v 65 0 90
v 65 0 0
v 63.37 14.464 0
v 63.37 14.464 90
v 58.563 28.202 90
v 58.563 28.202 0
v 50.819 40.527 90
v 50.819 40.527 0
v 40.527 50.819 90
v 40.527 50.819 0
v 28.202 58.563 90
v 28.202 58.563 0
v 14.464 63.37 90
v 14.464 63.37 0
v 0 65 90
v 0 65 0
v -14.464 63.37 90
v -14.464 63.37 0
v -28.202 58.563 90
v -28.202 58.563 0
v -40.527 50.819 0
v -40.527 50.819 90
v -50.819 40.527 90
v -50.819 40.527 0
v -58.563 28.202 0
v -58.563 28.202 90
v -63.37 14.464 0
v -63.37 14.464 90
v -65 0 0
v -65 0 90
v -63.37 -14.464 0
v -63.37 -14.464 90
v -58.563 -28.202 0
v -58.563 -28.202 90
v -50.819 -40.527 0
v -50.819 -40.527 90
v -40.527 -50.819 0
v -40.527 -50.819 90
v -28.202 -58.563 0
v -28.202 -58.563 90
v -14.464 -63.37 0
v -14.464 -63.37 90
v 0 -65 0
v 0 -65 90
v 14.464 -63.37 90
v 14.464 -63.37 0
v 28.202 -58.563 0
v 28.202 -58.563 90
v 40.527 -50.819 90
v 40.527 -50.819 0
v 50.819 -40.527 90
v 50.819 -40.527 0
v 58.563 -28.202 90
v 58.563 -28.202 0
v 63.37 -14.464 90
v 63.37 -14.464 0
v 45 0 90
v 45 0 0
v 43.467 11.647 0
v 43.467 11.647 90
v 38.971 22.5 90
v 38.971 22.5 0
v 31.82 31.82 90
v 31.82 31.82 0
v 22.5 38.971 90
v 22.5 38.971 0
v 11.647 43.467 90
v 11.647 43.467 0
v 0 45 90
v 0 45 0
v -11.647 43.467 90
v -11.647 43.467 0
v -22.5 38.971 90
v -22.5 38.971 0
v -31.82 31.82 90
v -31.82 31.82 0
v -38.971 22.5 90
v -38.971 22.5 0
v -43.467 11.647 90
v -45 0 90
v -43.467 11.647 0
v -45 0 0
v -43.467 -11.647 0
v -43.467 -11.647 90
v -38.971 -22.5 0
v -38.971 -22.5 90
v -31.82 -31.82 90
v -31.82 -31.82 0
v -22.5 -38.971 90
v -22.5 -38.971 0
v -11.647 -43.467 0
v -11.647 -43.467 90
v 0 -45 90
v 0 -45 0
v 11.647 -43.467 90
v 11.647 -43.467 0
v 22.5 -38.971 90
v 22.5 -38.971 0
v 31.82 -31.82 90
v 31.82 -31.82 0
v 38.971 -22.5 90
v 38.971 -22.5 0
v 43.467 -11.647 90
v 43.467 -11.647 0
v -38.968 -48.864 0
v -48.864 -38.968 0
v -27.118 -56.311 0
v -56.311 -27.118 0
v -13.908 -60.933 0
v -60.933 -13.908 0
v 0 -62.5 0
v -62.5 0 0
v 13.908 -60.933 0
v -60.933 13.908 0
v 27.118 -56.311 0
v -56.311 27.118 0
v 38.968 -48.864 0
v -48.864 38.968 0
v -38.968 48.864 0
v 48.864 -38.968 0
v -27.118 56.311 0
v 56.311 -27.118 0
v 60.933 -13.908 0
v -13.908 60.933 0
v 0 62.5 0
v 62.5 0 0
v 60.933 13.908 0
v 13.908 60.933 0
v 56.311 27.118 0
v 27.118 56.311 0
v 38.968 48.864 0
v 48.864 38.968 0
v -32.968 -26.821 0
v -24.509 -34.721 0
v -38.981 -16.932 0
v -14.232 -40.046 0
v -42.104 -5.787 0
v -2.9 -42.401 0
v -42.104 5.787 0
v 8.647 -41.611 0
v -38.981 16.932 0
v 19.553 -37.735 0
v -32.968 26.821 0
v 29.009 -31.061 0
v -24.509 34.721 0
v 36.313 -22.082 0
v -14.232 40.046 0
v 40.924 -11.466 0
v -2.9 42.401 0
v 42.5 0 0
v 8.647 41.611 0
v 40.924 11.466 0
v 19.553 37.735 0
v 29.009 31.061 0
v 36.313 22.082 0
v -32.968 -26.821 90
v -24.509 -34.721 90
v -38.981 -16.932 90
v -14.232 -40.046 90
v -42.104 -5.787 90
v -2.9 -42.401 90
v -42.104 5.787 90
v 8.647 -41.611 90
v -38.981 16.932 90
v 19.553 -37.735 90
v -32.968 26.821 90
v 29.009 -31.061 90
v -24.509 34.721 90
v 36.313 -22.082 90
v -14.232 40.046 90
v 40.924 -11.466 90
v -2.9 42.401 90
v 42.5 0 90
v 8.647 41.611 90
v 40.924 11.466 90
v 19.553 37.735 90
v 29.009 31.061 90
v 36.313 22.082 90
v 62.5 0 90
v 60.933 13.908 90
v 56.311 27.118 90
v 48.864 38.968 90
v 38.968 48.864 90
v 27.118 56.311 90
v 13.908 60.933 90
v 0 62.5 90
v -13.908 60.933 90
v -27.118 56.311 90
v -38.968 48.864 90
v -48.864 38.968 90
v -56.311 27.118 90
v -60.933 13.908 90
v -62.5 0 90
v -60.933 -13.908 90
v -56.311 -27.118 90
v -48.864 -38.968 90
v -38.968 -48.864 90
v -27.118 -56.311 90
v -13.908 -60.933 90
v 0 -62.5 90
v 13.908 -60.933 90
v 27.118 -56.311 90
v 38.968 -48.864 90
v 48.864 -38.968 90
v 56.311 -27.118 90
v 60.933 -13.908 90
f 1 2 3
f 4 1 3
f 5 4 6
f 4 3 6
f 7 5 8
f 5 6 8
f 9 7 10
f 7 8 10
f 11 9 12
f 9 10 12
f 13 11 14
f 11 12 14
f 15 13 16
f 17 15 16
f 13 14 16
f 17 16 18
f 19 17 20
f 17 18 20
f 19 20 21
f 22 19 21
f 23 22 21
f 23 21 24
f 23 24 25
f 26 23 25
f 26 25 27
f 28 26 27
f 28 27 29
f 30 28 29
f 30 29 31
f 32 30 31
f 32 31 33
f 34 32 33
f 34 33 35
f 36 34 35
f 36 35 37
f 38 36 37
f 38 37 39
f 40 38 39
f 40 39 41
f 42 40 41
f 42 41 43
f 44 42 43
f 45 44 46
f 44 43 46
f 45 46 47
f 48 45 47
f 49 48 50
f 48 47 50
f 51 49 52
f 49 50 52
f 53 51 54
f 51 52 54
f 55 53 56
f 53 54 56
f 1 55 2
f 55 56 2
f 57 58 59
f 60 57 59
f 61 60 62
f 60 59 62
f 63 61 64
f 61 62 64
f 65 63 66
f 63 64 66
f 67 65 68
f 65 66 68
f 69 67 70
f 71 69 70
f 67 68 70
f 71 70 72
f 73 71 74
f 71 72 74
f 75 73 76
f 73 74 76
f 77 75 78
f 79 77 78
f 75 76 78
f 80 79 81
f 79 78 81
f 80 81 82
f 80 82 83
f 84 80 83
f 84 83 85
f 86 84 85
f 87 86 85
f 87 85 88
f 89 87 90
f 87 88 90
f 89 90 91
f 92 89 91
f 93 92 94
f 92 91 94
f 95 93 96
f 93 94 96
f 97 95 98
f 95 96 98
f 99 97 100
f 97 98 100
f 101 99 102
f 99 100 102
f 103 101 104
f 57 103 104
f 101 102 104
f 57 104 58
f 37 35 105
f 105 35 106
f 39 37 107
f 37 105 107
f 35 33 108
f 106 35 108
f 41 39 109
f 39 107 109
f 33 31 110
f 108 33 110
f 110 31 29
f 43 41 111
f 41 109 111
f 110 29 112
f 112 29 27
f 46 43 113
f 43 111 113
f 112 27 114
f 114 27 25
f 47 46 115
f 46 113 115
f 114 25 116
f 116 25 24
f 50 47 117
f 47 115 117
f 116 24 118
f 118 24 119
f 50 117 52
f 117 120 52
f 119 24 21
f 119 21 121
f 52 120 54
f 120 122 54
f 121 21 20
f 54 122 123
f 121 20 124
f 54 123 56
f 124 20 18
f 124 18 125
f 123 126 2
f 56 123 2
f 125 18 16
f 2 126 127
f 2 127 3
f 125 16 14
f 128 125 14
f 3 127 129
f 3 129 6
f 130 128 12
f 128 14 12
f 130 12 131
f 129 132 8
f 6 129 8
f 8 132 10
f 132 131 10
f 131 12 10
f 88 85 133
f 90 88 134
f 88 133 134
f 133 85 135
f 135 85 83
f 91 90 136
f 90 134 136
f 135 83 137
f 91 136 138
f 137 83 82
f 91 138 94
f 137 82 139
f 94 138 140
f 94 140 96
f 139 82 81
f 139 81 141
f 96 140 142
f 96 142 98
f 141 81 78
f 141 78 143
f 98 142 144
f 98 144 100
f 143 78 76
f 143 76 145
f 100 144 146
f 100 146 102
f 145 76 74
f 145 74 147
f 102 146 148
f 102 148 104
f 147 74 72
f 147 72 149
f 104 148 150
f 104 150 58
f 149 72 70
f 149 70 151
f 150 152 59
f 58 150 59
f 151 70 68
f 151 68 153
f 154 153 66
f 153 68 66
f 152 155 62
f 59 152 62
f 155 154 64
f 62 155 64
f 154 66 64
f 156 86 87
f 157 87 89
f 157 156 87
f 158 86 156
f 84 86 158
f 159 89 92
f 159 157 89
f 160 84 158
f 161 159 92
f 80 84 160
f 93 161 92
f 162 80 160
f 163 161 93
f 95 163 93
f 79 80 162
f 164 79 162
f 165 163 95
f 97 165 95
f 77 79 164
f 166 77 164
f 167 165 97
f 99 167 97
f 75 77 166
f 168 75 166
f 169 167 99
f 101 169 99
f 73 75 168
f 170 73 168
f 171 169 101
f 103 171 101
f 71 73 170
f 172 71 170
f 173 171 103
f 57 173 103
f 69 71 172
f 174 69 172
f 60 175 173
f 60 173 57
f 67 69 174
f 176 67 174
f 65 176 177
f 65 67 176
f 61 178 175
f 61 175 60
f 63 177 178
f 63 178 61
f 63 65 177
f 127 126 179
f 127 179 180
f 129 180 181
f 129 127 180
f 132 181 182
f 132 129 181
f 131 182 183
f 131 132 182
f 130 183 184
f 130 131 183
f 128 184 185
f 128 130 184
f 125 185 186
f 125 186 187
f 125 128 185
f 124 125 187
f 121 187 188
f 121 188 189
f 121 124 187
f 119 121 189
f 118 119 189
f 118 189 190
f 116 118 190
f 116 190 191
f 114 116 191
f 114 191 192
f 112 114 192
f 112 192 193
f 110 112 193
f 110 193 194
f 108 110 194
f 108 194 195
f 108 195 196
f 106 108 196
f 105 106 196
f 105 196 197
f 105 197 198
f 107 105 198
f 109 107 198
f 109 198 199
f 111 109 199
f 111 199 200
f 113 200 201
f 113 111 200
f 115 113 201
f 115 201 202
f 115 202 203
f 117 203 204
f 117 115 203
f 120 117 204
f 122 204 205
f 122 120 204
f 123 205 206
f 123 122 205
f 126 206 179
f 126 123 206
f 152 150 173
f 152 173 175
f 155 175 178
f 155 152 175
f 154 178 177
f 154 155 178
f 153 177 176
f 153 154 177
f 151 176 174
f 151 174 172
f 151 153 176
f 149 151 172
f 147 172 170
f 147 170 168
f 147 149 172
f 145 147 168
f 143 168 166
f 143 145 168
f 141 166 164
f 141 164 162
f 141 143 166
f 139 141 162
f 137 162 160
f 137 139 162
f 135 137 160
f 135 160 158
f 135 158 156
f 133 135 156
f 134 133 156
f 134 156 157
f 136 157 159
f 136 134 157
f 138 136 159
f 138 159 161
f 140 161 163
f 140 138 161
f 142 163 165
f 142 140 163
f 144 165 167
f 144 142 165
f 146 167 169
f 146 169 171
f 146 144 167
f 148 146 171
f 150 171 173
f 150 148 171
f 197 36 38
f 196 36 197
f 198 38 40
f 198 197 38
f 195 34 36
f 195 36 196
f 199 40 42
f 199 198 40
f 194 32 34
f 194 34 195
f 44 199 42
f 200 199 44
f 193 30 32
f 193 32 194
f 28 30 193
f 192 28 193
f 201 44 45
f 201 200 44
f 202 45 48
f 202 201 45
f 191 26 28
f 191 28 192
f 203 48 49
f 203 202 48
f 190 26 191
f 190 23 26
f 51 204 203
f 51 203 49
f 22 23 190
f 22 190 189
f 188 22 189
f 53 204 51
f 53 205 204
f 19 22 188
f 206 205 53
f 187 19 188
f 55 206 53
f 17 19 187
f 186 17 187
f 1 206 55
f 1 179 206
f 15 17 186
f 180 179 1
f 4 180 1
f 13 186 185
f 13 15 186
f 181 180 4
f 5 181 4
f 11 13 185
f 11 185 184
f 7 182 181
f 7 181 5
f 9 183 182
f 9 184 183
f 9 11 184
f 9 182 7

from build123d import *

# Parameters (mm, degrees)
F0_R     = 65
F0_R_2   = 62.5
F1_DEPTH = 90
F0_R_3   = 45
F0_R_4   = 42.5
F2_W     = 130
F2_H     = 65
F3_DEPTH = 250


# Not quite as in the source:
# - an extrude ends at something that could not be found from the text; its depth is read off the source's solid


with BuildPart() as f1:
    # F0 (on Top) → F1 (new body)
    with BuildSketch(Plane.XY):
        Circle(F0_R)
        Circle(F0_R_2, mode=Mode.SUBTRACT)
    extrude(amount=F1_DEPTH)

    # F2 (on Top) → F3 (cut, through all)
    with BuildSketch(Plane.XY):
        with Locations((0, -32.5)):
            Rectangle(F2_W, F2_H)
    extrude(amount=-F3_DEPTH, mode=Mode.SUBTRACT)


with BuildPart() as f1b:
    # F0 (on Top) → F1, piece 2 (new body)
    with BuildSketch(Plane.XY):
        Circle(F0_R_3)
        Circle(F0_R_4, mode=Mode.SUBTRACT)
    extrude(amount=F1_DEPTH)


solid = Compound([f1.part, f1b.part])
